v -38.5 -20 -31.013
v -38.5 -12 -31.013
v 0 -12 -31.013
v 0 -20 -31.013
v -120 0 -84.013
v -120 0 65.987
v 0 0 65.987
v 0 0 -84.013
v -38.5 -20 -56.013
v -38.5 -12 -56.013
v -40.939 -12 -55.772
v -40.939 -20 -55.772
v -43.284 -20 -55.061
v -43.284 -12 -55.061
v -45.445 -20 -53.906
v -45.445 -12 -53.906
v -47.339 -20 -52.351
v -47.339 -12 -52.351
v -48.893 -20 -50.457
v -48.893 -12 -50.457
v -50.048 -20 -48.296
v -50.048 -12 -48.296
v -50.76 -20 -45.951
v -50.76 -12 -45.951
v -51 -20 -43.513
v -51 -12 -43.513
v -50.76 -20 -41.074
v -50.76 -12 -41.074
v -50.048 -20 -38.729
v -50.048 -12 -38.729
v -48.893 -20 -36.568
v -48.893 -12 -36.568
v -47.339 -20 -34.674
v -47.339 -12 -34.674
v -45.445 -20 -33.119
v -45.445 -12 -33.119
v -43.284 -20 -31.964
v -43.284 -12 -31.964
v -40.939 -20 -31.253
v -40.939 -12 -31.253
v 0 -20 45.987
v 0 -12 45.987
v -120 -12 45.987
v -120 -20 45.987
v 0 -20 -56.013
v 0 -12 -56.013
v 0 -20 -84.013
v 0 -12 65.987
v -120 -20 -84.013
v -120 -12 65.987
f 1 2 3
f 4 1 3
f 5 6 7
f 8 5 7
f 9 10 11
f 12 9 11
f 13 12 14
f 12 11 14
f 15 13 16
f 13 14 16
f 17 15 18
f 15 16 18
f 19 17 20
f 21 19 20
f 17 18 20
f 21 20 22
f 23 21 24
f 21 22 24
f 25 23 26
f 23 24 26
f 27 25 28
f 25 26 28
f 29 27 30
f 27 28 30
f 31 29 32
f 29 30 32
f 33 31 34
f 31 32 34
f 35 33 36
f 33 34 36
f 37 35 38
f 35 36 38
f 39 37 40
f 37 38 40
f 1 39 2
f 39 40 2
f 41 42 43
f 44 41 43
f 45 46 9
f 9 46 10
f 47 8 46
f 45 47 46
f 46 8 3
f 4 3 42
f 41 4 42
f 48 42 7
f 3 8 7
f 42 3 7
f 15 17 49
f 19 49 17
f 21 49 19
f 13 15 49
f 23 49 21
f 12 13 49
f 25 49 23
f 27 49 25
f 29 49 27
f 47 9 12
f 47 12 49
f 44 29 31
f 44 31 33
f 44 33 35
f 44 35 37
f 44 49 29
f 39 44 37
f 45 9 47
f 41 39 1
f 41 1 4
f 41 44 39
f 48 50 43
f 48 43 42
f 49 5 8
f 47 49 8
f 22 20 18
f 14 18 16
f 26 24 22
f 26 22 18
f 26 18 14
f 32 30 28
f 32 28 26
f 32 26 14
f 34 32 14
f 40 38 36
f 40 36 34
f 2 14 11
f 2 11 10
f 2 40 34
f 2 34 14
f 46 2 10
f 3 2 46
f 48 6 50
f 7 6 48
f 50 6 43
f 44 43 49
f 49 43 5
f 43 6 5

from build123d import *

# Parameters (mm, degrees)
F0_W     = 120
F0_H     = 20
F1_DEPTH = 12
F2_DEPTH = 20
F3_DEPTH = 20
F4_DEPTH = 20
F5_DEPTH = 12


with BuildPart() as f1:
    # F0 (on Front) → F1 (new body)
    with BuildSketch(Plane.XZ):
        with Locations((-60, 55.987342)):
            Rectangle(F0_W, F0_H)
    extrude(amount=F1_DEPTH)

    # F0 (on Front) → F2 (join)
    with BuildSketch(Plane.XZ):
        Polygon((0, 45.987342), (-120, 45.987342), (-120, -31.012658), (-38.5, -31.012658), (0, -31.012658), align=None)
    extrude(amount=F2_DEPTH)

    # F0 (on Front) → F3 (join)
    with BuildSketch(Plane.XZ):
        with BuildLine():
            Line((-38.5, -31.012658), (-120, -31.012658))
            Line((-120, -31.012658), (-120, -56.012658))
            Line((-120, -56.012658), (-38.5, -56.012658))
            ThreePointArc((-38.5, -56.012658), (-51, -43.512658), (-38.5, -31.012658))
        make_face()
    extrude(amount=F3_DEPTH)

    # F0 (on Front) → F4 (join)
    with BuildSketch(Plane.XZ):
        Polygon((-38.5, -56.012658), (-120, -56.012658), (-120, -84.012658), (0, -84.012658), (0, -56.012658), align=None)
    extrude(amount=F4_DEPTH)

    # F0 (on Front) → F5 (join)
    with BuildSketch(Plane.XZ):
        with BuildLine():
            Line((0, -31.012658), (-38.5, -31.012658))
            ThreePointArc((-38.5, -31.012658), (-51, -43.512658), (-38.5, -56.012658))
            Line((-38.5, -56.012658), (0, -56.012658))
            Line((0, -56.012658), (0, -31.012658))
        make_face()
    extrude(amount=F5_DEPTH)


solid = f1.part
